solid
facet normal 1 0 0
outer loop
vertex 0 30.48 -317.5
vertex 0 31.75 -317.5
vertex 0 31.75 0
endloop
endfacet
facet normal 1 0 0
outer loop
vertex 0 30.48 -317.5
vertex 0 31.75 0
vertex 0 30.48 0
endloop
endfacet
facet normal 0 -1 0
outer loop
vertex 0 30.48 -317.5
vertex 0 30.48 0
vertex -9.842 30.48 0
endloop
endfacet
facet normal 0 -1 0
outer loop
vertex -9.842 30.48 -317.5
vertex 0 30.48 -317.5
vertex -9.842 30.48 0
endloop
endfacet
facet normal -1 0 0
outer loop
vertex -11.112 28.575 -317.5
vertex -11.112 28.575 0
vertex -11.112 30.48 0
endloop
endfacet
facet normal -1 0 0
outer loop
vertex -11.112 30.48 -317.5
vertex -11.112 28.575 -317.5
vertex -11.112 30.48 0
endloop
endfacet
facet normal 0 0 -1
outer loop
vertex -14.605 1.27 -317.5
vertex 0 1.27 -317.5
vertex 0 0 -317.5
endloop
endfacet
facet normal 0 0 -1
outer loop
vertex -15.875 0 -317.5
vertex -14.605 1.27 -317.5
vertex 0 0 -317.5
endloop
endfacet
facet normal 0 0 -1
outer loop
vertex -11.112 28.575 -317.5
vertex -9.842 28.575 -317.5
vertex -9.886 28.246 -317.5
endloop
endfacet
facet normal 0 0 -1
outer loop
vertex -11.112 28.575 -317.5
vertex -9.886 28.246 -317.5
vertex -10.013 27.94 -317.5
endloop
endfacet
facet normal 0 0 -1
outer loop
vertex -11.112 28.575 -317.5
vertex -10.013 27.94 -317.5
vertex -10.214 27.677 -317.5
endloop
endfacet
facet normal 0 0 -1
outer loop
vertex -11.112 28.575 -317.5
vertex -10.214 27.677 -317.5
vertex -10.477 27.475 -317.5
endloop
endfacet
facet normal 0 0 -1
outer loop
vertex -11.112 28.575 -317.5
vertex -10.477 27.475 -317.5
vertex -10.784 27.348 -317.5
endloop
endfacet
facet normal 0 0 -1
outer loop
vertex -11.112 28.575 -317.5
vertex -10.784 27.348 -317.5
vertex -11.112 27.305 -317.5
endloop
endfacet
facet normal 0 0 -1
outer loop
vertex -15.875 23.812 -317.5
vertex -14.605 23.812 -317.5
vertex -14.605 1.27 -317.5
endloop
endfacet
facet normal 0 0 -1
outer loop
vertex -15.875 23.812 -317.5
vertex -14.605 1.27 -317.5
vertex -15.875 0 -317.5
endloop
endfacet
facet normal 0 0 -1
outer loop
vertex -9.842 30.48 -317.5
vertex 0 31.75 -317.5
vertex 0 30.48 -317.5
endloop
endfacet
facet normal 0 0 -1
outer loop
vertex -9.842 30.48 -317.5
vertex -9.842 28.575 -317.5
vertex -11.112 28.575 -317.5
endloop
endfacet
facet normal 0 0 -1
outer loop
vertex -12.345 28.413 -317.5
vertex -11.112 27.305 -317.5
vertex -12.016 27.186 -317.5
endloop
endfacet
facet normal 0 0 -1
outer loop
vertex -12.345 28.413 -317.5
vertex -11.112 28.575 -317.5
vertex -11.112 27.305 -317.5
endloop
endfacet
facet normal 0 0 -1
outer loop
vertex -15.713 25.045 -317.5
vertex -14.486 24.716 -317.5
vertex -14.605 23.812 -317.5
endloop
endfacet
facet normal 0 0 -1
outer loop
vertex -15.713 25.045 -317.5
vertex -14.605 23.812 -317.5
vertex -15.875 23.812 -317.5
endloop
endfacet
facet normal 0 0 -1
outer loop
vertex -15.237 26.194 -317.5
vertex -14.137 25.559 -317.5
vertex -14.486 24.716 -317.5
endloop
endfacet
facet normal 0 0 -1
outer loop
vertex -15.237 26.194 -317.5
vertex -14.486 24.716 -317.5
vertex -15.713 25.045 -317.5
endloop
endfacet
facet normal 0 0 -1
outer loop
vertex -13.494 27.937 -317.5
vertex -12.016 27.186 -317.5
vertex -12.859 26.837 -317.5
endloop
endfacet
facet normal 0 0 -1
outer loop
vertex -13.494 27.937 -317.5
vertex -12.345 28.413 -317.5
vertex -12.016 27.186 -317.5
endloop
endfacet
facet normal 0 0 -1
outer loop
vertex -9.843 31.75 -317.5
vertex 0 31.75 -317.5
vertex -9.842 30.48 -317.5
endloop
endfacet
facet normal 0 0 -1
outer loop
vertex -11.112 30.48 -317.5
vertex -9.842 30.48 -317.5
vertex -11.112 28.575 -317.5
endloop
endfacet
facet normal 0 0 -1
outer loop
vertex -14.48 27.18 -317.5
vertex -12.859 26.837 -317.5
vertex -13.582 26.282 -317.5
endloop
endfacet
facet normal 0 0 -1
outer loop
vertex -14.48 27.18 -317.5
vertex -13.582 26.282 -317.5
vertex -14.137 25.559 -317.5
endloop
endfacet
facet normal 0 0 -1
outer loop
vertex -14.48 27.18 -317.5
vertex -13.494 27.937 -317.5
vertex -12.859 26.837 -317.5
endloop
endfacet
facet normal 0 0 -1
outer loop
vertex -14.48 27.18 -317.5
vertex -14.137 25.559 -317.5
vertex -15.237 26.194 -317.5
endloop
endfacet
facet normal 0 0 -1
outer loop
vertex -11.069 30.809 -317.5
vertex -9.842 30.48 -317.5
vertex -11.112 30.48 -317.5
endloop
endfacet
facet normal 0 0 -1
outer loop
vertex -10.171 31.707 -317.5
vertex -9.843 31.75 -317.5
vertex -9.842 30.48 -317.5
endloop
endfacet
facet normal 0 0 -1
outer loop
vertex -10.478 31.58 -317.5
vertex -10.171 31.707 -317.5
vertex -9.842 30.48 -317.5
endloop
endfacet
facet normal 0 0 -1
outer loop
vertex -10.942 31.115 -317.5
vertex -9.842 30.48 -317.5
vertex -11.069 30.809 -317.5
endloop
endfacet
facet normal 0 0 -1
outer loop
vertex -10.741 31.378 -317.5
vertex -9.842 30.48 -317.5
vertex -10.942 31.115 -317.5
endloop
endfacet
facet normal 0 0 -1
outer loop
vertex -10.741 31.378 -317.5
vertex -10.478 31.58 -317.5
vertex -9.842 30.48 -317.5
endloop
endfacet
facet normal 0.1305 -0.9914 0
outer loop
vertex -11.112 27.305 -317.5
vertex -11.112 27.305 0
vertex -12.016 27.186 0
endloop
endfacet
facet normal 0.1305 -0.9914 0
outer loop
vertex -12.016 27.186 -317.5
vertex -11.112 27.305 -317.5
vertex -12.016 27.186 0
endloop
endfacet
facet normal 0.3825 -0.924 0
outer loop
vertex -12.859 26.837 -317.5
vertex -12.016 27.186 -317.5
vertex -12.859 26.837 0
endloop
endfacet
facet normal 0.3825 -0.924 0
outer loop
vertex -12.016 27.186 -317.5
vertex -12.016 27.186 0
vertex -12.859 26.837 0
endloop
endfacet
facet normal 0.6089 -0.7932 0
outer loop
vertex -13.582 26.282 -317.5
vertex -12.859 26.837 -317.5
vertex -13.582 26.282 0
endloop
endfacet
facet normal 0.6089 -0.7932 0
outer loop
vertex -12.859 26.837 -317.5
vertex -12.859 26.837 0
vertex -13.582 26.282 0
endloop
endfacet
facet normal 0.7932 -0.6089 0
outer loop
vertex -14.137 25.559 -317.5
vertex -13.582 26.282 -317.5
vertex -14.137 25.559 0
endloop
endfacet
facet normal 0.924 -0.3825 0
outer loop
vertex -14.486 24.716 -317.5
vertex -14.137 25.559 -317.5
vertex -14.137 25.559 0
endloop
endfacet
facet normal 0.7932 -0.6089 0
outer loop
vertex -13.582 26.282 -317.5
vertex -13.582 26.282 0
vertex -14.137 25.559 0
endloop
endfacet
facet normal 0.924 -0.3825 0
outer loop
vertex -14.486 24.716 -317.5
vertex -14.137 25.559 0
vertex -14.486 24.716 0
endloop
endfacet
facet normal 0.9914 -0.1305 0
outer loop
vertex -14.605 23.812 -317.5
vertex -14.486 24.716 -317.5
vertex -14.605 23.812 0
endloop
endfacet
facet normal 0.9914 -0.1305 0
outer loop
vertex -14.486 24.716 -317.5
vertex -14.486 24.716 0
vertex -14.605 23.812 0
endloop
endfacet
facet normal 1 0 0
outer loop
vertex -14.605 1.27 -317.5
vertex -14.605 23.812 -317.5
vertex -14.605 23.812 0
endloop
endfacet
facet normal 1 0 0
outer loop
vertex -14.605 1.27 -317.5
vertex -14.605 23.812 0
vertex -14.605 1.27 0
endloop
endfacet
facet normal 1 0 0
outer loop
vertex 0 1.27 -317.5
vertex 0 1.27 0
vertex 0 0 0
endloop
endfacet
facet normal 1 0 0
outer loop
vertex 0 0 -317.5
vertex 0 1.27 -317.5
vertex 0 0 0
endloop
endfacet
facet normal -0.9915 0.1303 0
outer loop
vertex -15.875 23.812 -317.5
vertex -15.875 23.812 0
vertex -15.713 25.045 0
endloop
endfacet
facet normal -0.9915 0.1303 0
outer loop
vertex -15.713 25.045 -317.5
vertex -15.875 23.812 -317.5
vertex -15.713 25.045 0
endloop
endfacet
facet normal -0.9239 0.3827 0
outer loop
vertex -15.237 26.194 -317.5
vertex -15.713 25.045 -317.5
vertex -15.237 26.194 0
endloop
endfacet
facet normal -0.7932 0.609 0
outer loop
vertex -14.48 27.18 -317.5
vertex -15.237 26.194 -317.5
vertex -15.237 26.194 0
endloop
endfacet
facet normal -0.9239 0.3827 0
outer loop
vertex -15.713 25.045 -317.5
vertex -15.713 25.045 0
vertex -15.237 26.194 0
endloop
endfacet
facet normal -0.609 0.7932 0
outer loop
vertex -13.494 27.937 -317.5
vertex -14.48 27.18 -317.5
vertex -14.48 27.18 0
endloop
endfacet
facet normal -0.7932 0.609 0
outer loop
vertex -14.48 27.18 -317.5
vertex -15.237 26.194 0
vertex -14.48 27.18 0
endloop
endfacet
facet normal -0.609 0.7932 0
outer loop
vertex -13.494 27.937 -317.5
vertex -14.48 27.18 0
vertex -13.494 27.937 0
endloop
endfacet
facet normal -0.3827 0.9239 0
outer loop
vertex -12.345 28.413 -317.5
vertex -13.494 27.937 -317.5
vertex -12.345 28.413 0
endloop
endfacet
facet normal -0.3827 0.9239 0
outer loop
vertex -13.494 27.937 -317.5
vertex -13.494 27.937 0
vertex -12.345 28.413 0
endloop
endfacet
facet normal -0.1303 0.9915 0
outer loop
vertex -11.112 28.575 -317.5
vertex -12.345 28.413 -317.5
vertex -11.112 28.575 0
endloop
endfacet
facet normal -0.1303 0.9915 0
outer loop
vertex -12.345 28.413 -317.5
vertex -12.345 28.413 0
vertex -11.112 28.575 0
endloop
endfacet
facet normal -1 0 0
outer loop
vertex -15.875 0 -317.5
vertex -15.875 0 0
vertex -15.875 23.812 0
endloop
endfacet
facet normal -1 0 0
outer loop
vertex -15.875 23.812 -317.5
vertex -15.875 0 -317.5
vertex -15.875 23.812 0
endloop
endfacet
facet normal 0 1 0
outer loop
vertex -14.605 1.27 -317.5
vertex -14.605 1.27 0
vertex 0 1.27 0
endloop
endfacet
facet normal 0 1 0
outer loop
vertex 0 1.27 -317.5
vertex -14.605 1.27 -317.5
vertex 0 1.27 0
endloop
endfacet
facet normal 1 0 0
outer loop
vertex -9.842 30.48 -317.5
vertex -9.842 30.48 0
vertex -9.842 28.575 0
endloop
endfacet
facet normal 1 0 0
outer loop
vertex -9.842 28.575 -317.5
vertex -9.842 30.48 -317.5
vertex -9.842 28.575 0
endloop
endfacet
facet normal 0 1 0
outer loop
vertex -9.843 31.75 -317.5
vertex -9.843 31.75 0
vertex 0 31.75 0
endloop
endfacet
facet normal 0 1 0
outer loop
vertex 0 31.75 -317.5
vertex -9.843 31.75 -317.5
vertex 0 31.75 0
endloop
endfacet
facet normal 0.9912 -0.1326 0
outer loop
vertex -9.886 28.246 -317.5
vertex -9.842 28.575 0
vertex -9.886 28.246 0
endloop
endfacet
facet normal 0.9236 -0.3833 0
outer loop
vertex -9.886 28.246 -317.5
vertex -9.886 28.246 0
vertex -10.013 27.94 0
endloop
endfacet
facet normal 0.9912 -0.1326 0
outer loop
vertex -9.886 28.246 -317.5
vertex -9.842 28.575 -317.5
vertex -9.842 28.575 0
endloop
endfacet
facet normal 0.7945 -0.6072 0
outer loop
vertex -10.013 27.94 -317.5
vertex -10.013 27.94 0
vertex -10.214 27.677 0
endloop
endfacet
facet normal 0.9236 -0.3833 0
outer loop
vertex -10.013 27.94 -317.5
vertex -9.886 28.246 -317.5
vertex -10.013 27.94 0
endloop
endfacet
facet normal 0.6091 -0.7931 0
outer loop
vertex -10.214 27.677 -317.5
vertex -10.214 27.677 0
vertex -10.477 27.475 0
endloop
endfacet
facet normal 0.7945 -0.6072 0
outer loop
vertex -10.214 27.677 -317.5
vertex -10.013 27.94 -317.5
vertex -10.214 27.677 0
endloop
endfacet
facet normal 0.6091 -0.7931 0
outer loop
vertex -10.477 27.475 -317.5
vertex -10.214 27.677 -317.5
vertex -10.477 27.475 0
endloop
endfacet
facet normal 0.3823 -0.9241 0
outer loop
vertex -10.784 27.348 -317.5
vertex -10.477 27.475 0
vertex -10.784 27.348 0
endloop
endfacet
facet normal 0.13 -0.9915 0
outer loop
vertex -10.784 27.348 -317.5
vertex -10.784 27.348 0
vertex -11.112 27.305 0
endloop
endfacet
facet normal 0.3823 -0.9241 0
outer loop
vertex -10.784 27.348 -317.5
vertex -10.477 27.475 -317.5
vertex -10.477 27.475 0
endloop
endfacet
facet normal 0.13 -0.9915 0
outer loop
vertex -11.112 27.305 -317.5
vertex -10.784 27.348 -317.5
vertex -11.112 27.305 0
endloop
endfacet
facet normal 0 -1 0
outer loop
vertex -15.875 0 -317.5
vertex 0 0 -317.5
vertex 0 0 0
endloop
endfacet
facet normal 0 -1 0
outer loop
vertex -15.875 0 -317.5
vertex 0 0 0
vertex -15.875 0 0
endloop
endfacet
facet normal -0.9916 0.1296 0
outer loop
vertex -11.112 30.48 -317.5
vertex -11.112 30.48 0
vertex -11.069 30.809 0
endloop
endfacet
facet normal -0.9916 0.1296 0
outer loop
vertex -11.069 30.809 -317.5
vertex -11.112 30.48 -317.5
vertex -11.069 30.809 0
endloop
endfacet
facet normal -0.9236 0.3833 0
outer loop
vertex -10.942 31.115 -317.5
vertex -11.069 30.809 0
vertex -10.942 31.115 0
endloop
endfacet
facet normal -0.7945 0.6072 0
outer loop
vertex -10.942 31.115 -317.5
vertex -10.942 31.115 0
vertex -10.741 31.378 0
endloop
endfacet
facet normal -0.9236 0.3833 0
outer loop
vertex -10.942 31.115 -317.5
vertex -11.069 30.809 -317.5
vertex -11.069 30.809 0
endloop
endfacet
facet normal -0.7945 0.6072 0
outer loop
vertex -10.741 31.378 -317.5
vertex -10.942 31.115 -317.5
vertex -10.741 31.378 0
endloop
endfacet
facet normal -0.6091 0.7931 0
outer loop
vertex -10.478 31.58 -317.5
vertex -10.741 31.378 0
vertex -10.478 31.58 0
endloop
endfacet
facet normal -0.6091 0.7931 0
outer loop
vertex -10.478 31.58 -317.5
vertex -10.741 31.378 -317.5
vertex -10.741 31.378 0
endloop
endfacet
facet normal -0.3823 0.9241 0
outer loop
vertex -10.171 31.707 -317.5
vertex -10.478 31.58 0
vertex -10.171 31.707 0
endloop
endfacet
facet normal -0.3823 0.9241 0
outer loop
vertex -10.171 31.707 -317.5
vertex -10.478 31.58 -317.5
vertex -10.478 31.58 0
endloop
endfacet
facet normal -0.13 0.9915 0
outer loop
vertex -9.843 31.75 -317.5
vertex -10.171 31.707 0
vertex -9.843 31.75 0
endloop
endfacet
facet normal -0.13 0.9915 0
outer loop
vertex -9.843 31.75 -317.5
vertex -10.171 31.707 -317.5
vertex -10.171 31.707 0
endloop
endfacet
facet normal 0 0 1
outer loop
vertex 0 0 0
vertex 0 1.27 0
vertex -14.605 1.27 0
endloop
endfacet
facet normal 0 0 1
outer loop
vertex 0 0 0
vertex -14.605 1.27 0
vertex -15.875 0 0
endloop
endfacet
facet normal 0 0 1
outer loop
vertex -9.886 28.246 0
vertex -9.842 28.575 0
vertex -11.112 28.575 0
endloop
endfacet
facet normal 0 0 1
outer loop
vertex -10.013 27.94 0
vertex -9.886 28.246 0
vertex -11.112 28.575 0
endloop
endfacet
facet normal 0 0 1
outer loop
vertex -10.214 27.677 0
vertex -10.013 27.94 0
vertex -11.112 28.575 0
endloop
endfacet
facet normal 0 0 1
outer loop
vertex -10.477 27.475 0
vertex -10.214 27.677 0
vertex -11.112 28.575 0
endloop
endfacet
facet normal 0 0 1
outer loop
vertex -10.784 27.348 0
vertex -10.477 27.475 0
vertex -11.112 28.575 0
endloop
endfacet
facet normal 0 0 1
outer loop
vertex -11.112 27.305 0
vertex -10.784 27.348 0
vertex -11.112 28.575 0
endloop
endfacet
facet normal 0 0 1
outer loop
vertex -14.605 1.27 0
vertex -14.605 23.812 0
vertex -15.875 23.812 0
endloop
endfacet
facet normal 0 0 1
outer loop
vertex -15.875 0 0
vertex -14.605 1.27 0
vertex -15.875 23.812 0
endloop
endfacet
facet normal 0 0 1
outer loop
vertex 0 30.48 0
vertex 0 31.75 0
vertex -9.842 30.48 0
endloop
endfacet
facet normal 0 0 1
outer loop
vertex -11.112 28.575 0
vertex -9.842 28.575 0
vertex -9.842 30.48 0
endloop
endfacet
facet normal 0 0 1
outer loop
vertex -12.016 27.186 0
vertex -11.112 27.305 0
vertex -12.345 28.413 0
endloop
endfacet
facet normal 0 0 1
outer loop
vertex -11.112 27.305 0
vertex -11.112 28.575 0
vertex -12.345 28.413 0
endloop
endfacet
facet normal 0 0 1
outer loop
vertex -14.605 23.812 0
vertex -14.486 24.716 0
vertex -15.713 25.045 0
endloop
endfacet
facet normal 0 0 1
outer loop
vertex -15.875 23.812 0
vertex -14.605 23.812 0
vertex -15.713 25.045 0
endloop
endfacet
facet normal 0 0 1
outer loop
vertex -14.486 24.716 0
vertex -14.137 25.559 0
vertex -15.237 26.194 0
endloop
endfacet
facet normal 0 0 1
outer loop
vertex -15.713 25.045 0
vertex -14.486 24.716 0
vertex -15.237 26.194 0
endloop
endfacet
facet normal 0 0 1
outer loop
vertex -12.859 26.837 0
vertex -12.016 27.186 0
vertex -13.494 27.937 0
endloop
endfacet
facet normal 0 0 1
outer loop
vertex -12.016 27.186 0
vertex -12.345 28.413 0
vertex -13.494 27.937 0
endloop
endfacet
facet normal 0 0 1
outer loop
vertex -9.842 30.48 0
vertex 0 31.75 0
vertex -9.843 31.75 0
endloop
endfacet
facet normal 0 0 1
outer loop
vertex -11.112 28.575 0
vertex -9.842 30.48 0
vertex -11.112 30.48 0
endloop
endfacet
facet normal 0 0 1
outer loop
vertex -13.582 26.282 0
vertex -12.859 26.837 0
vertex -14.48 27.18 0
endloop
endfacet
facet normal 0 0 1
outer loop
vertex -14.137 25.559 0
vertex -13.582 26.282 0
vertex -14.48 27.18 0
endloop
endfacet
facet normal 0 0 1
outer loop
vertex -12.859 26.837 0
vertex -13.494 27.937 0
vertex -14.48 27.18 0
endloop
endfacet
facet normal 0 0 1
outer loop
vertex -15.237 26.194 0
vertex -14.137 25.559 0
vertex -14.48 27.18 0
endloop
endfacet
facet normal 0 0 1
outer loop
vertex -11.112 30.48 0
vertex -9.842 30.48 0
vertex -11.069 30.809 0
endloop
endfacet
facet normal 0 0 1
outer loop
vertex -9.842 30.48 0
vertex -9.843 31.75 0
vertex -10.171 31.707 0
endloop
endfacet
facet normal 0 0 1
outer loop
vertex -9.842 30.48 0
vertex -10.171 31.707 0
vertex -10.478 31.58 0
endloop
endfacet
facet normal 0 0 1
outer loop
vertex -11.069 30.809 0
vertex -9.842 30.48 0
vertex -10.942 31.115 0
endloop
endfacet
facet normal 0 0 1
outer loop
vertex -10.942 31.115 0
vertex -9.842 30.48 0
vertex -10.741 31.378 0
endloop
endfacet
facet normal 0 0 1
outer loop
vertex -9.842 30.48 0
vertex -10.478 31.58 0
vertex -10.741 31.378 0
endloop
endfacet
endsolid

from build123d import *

# Parameters (mm, degrees)
EXTRUDE_THIN1_DEPTH = 317.5
FILLET1_R           = 1.27


with BuildPart() as part:
    # Sketch1 → Extrude-Thin1 (new body)
    with BuildSketch(Plane.XY):
        with BuildLine():
            Line((0, 0), (-15.875, 0))
            Line((-15.875, 0), (-15.875, 23.8125))
            ThreePointArc((-15.875, 23.8125), (-14.480096045, 27.180096045), (-11.1125, 28.575))
            Line((-11.1125, 28.575), (-11.1125, 31.75))
            Line((-11.1125, 31.75), (0, 31.75))
            Line((0, 31.75), (0, 30.48))
            Line((0, 30.48), (-9.8425, 30.48))
            Line((-9.8425, 30.48), (-9.8425, 27.065906868))
            ThreePointArc((-9.8425, 27.065906868), (-13.082535691, 26.696336962), (-14.605, 23.8125))
            Line((-14.605, 23.8125), (-14.605, 1.27))
            Line((-14.605, 1.27), (0, 1.27))
            Line((0, 1.27), (0, 0))
        make_face()
    extrude(amount=-EXTRUDE_THIN1_DEPTH)

    # Fillet1
    fillet1_edges = [part.edges().sort_by_distance(p)[0] for p in [
        (-9.8425, 27.065906868, -158.75),
        (-11.1125, 31.75, -158.75),
    ]]
    fillet(fillet1_edges, radius=FILLET1_R)


solid = part.part
